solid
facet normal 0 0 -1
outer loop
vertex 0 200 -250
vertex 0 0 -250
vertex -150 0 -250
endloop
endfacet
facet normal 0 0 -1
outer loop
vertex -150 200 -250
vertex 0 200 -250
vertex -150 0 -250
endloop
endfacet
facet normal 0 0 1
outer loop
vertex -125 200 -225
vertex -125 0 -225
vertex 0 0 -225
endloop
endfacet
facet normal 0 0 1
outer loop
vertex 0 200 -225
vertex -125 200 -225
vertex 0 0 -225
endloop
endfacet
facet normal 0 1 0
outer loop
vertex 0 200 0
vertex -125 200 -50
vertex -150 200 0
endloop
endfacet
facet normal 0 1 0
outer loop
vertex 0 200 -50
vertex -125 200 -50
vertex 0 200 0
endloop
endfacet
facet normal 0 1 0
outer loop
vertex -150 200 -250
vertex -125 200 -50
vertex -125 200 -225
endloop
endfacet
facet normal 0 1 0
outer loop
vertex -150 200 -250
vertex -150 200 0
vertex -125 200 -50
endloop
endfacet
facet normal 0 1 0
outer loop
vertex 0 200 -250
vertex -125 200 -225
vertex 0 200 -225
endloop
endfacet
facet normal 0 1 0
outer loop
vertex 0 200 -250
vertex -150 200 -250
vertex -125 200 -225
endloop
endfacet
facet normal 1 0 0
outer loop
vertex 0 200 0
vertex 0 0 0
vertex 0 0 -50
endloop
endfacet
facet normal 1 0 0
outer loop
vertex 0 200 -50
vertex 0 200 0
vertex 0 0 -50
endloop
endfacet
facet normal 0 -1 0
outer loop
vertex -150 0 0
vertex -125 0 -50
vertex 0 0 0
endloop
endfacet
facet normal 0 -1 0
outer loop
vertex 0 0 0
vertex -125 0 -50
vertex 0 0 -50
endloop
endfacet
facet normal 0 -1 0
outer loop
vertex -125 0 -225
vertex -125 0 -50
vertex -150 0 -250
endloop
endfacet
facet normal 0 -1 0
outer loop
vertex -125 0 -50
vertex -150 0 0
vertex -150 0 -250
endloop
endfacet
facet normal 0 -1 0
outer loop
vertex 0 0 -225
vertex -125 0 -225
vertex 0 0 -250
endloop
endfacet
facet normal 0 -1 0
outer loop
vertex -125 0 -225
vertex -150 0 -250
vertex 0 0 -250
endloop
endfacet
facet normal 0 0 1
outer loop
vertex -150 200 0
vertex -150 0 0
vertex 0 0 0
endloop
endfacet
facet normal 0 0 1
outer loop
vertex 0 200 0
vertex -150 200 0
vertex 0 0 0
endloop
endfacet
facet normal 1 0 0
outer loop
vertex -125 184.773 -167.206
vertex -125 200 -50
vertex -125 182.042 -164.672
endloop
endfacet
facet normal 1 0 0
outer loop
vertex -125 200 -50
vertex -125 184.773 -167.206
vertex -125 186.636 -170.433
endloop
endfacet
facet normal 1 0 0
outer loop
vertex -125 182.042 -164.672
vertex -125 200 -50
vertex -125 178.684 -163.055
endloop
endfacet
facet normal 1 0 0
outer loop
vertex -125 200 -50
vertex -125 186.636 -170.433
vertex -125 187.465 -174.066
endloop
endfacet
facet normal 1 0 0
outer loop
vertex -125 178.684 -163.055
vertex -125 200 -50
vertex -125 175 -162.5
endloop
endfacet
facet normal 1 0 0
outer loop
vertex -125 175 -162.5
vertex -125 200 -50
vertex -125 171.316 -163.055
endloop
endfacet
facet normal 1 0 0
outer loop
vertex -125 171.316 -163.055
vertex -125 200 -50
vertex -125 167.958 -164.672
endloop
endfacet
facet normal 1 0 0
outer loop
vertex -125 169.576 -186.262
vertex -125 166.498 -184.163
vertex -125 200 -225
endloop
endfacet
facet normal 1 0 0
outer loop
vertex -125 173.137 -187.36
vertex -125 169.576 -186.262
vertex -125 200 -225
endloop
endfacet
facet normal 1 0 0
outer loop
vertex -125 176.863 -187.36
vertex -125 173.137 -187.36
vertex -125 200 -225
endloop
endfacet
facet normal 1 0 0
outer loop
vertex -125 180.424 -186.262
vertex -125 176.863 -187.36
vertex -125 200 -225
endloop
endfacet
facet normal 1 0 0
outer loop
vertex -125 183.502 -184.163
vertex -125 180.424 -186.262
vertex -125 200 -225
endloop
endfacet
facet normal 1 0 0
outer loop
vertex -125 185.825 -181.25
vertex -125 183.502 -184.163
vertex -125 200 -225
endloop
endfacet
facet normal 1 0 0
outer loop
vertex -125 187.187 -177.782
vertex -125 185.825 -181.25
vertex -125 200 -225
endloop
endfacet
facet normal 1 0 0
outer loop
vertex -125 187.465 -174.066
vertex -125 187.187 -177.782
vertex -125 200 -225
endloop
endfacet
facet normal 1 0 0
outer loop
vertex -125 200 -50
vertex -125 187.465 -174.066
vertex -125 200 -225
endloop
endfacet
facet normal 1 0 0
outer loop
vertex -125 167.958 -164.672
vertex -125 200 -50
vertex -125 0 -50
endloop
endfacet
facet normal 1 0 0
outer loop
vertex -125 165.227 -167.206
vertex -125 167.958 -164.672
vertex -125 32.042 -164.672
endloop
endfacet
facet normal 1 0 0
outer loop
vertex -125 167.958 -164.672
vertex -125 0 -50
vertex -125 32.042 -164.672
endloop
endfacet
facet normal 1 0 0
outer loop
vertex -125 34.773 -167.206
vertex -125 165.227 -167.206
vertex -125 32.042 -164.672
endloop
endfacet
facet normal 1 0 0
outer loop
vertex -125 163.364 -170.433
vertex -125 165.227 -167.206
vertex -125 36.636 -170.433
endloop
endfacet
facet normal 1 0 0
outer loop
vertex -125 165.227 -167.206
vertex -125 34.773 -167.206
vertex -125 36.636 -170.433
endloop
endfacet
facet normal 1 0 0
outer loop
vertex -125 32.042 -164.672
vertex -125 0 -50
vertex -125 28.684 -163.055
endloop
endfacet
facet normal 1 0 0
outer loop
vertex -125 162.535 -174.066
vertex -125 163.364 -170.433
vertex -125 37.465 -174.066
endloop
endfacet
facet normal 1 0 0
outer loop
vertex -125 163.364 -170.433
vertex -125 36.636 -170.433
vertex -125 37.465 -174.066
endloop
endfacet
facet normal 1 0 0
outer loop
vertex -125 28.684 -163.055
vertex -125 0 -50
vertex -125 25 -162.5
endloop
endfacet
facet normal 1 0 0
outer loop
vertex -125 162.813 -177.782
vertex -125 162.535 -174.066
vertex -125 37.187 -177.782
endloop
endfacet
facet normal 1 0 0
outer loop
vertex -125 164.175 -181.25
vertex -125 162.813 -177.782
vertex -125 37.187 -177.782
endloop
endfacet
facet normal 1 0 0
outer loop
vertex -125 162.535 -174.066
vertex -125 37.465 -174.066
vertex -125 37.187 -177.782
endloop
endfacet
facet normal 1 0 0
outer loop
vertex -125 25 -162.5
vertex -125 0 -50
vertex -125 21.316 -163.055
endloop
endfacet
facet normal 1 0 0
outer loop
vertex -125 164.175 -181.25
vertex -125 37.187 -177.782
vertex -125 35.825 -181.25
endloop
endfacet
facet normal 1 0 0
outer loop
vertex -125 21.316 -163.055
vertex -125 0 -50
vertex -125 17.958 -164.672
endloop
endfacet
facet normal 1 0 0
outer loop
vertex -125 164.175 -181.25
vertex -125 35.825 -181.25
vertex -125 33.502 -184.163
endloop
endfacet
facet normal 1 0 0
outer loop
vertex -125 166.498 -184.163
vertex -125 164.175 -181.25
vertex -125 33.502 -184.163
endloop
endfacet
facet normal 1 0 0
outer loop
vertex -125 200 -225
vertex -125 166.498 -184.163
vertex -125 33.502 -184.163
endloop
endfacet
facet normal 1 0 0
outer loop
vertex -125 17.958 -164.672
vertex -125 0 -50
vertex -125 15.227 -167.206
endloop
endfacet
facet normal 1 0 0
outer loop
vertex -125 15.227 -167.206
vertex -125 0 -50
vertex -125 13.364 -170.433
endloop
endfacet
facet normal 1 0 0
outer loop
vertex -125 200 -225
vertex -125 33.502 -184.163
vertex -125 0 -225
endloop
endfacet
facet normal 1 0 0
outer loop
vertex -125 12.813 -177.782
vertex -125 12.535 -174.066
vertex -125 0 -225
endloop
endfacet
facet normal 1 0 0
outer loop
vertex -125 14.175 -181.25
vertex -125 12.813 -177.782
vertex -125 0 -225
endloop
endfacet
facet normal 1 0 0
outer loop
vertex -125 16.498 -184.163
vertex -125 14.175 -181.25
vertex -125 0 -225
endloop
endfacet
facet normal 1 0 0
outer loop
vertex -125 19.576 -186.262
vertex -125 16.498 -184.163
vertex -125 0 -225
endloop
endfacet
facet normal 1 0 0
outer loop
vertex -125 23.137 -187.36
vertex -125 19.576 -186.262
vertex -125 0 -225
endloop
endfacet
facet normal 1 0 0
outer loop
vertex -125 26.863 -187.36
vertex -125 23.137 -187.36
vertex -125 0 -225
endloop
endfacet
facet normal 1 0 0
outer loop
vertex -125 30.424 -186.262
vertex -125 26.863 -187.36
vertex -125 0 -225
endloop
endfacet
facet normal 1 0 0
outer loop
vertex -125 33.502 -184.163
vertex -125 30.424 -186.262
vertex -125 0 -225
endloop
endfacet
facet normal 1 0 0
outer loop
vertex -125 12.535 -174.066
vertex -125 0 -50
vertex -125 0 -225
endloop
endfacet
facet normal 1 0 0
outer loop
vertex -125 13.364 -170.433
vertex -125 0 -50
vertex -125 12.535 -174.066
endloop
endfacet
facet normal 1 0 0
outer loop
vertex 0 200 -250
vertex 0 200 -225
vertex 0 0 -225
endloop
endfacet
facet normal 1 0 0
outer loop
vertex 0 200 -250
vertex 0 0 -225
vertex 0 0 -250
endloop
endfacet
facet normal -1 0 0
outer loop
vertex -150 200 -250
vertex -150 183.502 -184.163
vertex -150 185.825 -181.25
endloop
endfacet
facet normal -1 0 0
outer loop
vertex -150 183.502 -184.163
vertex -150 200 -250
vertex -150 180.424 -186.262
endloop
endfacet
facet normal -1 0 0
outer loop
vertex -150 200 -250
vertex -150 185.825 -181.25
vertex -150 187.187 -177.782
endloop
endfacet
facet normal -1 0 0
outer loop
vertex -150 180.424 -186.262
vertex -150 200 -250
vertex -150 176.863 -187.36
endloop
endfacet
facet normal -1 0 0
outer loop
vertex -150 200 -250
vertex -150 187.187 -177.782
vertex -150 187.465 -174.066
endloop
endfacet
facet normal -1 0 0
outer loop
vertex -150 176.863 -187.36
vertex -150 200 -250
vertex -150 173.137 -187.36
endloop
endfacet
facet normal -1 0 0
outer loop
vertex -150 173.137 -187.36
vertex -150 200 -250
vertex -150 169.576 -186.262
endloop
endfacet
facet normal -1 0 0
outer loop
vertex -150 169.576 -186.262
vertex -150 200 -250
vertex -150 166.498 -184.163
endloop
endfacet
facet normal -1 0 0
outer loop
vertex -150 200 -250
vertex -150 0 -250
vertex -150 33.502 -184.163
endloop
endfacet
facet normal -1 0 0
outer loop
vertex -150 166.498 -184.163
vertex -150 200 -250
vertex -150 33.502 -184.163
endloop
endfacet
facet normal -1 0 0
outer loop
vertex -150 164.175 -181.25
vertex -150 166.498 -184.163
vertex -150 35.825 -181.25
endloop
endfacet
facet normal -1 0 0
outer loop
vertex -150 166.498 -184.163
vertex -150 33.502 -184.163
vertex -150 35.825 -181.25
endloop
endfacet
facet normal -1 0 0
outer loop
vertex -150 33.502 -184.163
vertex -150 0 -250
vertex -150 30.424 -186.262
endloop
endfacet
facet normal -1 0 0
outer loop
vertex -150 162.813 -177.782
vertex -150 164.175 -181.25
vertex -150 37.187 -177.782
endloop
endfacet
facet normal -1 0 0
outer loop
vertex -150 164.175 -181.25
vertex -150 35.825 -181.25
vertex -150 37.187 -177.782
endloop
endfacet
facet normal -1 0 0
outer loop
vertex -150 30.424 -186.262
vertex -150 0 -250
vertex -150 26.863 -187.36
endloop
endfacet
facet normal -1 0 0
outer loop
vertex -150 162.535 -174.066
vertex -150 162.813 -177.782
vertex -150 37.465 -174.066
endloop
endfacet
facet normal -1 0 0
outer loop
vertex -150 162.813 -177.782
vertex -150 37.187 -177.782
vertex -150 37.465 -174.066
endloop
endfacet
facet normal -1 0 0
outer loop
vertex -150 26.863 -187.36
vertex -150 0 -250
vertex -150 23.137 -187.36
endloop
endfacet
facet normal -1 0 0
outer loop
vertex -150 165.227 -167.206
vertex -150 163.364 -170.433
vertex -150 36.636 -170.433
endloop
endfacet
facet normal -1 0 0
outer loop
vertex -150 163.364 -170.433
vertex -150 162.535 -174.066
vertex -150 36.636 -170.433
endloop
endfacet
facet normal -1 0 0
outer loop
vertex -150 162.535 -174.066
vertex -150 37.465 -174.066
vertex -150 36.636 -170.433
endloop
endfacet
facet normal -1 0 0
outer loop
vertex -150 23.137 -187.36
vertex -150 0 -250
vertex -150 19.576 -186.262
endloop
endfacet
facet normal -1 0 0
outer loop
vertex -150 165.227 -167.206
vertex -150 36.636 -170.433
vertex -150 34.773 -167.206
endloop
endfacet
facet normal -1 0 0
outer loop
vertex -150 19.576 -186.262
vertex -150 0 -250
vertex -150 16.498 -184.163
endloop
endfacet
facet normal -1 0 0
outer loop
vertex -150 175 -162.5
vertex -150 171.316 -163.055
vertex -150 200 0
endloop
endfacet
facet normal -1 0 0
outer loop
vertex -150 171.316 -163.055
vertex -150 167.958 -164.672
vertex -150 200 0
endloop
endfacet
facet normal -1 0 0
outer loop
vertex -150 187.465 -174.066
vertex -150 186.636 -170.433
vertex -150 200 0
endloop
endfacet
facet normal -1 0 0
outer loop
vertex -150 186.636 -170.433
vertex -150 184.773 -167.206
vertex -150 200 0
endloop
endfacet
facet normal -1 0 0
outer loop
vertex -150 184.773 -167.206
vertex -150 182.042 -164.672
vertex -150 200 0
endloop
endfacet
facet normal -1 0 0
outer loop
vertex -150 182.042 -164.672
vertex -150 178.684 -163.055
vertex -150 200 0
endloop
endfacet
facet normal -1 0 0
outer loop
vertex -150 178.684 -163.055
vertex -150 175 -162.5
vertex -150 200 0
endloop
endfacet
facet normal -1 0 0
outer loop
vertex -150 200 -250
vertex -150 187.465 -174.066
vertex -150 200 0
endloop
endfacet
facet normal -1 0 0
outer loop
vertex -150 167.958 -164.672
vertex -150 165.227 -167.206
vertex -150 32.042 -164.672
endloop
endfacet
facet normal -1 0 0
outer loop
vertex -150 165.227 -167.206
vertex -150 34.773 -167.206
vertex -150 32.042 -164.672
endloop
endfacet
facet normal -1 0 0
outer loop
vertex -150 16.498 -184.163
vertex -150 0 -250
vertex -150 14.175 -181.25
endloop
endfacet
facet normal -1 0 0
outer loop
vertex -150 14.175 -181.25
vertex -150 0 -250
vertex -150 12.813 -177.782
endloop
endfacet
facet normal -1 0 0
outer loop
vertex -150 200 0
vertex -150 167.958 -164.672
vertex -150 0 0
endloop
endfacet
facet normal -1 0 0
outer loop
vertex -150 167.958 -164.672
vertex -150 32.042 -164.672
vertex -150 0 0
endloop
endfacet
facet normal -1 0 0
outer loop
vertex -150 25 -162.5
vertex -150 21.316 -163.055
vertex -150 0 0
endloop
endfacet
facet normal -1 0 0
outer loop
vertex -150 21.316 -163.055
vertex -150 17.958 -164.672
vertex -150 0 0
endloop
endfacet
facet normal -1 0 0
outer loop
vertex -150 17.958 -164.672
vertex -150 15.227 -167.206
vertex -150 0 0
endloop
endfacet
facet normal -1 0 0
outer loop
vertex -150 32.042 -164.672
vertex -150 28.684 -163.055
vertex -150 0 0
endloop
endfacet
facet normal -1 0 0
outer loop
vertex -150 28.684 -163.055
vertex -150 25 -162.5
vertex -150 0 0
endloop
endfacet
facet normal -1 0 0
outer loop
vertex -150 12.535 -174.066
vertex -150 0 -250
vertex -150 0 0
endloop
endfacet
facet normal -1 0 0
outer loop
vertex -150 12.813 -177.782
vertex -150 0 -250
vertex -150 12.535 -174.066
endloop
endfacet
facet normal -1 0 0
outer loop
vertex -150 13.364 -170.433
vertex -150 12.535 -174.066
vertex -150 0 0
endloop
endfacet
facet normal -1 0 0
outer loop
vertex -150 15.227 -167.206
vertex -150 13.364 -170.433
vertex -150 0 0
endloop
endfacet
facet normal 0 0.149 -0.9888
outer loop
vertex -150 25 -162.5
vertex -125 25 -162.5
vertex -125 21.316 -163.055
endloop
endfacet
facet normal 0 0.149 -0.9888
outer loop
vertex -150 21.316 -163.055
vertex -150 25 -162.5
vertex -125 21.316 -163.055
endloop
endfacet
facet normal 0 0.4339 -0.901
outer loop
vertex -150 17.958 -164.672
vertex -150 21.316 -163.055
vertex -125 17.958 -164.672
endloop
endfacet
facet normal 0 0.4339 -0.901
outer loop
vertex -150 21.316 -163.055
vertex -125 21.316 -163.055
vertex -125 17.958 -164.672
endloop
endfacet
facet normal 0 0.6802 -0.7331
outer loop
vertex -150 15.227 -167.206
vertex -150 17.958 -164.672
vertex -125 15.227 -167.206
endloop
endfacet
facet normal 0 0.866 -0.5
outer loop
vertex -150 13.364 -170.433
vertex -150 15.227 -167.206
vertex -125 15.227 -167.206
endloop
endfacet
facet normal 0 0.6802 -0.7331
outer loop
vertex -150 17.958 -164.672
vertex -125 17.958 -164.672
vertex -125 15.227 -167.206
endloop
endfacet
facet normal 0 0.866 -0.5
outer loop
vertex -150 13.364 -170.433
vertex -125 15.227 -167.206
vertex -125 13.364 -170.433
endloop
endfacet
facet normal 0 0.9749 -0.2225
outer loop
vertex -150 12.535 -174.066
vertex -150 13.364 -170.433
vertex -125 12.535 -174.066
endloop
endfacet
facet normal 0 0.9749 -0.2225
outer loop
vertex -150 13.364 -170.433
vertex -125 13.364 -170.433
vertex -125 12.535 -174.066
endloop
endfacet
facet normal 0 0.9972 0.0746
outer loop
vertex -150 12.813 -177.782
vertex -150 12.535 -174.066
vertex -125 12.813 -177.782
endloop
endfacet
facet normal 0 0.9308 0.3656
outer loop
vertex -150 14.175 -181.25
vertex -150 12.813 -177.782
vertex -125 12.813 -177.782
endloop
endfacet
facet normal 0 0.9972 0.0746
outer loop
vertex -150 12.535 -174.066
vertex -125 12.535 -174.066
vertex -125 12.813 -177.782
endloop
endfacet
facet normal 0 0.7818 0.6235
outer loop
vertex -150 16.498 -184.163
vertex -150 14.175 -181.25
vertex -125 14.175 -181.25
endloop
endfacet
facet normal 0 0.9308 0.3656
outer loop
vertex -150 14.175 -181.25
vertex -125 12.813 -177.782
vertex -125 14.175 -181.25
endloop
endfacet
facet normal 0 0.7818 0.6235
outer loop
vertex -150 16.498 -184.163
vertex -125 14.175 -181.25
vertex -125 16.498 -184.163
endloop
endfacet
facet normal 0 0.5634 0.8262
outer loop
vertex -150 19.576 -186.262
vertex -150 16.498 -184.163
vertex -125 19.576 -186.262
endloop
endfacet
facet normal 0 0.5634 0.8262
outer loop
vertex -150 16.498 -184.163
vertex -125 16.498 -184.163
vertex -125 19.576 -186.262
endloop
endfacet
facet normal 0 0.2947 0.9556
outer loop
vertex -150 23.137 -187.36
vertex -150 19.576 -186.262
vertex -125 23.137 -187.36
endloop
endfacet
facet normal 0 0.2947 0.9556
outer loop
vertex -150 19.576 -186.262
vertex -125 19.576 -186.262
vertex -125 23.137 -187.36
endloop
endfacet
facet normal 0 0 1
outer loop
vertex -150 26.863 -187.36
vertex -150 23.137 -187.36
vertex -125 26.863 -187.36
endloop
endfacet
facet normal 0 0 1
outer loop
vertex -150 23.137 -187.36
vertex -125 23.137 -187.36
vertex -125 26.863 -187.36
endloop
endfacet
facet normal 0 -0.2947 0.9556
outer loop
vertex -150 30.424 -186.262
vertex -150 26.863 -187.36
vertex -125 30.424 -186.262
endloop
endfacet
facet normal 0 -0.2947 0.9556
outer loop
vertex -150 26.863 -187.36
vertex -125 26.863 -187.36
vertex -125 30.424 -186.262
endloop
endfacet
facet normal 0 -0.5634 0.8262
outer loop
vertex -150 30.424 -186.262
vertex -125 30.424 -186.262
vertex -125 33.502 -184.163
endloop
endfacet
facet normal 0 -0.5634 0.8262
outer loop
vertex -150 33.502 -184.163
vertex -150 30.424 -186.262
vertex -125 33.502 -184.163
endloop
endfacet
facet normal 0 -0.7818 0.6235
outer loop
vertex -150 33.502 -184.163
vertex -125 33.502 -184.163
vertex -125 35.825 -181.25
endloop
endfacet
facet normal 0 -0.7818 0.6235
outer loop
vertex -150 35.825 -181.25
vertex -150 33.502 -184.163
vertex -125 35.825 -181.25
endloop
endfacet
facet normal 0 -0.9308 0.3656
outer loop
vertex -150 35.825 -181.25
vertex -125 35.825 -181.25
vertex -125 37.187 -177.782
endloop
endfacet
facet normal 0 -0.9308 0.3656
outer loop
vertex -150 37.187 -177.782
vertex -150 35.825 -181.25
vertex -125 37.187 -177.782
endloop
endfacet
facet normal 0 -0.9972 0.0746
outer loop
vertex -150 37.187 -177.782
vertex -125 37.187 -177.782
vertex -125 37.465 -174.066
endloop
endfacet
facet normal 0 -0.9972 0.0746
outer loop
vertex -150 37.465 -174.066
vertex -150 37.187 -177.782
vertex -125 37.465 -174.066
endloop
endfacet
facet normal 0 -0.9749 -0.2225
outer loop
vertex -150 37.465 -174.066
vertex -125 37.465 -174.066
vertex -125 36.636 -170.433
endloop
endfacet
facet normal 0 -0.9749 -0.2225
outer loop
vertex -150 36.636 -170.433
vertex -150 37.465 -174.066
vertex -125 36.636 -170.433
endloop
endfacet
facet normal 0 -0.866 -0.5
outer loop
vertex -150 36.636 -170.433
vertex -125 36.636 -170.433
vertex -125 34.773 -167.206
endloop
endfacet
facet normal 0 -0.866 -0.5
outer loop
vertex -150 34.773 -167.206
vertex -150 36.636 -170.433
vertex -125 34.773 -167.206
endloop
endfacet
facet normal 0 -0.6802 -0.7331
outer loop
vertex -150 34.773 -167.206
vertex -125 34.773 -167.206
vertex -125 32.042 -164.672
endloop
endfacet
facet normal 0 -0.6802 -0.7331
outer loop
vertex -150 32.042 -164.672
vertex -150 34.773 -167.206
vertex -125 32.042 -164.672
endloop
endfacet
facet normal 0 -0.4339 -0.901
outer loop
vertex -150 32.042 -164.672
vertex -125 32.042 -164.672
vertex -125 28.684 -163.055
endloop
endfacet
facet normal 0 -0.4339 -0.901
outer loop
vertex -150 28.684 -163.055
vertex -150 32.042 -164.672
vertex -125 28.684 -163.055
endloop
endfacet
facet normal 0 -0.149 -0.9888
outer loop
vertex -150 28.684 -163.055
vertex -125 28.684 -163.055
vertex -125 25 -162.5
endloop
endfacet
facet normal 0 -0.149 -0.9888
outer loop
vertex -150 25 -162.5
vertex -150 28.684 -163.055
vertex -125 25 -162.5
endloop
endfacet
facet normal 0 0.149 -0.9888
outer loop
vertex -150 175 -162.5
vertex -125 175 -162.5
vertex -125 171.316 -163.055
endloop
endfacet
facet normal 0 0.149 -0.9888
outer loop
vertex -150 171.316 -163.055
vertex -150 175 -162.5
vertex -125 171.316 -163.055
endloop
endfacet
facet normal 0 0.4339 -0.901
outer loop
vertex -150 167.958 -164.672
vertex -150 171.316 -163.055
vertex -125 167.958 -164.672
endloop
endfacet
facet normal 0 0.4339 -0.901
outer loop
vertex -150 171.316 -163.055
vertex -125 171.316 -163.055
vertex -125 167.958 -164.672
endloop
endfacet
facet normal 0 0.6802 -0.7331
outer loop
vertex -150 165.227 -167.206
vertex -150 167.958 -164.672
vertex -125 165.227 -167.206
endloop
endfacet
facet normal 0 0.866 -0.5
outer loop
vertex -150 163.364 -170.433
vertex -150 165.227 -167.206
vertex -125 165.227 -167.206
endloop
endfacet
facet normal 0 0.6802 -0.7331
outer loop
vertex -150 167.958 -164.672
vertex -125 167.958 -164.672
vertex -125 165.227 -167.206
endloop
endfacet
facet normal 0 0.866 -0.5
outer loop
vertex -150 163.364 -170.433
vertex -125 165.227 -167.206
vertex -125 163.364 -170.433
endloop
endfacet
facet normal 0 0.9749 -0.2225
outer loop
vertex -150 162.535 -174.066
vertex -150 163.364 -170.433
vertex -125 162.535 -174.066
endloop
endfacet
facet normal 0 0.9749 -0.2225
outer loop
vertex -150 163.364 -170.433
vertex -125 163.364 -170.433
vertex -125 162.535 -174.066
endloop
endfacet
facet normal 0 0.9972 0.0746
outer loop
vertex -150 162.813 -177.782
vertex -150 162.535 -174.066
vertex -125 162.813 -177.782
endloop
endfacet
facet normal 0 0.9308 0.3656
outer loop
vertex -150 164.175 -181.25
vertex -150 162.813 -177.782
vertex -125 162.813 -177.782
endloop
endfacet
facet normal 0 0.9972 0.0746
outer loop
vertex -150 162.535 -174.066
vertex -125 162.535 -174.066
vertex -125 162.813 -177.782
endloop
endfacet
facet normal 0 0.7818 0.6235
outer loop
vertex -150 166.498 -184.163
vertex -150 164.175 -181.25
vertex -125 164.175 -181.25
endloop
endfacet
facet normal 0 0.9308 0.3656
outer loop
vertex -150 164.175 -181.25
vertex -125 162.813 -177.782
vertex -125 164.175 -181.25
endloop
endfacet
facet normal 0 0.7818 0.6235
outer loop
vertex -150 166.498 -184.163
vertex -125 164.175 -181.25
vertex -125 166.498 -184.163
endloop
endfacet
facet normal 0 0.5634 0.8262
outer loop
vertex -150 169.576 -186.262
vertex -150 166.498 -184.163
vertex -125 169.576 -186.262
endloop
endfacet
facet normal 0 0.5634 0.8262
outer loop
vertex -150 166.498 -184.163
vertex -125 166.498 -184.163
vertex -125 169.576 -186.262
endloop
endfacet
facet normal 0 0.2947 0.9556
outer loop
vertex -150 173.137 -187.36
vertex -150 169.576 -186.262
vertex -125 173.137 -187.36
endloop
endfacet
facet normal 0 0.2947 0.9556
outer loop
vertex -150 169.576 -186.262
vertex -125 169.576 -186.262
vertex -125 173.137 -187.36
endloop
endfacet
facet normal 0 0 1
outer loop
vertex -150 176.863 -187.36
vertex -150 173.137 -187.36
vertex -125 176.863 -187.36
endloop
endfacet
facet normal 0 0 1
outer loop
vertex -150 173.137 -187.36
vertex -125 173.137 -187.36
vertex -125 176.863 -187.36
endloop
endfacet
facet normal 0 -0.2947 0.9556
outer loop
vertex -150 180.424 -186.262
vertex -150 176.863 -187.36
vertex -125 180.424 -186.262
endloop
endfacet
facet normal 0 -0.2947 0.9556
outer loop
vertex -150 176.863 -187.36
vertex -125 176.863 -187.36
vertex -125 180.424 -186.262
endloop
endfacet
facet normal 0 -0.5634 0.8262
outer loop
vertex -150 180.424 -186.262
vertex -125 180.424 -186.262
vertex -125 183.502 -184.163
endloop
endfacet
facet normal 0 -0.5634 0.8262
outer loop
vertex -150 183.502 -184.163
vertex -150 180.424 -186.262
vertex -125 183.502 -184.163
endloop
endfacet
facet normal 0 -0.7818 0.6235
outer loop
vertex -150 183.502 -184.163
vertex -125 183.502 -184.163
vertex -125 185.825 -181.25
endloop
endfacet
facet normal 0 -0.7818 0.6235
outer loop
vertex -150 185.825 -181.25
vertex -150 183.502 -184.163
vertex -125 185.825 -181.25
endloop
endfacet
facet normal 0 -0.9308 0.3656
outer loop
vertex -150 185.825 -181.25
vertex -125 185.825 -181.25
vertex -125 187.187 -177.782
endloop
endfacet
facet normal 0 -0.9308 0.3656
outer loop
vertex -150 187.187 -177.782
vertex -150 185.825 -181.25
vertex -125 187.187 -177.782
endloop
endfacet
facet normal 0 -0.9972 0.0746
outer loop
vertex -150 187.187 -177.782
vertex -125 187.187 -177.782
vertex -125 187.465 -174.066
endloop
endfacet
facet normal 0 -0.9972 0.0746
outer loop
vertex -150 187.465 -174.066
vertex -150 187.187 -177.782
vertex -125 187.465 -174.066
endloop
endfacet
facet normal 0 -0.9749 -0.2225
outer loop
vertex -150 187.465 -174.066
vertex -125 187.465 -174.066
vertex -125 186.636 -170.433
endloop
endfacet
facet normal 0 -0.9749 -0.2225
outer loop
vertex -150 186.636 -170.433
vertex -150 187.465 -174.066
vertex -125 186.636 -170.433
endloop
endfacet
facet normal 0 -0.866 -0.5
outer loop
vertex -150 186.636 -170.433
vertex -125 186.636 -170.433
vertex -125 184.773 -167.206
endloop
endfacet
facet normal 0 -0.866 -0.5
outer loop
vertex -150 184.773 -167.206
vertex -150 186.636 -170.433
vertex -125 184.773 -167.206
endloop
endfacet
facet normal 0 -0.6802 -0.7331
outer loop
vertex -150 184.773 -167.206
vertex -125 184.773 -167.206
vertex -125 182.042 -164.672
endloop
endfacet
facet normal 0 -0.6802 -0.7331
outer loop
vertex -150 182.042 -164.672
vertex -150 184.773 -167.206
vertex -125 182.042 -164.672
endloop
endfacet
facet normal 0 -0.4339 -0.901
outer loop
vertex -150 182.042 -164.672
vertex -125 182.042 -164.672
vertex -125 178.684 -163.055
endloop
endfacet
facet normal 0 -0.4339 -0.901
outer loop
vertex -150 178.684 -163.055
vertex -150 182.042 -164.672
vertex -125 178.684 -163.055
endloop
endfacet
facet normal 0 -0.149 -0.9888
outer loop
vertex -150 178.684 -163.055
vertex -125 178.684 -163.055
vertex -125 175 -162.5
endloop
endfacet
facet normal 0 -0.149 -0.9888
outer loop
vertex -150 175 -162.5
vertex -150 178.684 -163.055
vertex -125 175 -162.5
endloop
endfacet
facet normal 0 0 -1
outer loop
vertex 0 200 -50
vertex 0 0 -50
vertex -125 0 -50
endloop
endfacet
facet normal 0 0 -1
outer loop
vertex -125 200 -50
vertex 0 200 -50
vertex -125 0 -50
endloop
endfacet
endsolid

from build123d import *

# Parameters (mm, degrees)
BOSS_EXTRUDE1_DEPTH = 200
HOLE1_D             = 25


with BuildPart() as part:
    # Sketch1 → Boss-Extrude1 (new body)
    with BuildSketch(Plane(origin=(0, 0, 0), x_dir=(1, 0, 0), z_dir=(0, 1, 0))):
        Polygon((0, 225), (0, 250), (-150, 250), (-150, 0), (0, 0), (0, 50), (-125, 50), (-125, 225), align=None)
    extrude(amount=BOSS_EXTRUDE1_DEPTH)

    # Hole1 (through all)
    with Locations(Plane(origin=(-150, 175, -175), x_dir=(0, 0, -1), z_dir=(-1, 0, 0))):
        with Locations((0, 0), (0, 150)):
            Hole(HOLE1_D / 2)


solid = part.part
